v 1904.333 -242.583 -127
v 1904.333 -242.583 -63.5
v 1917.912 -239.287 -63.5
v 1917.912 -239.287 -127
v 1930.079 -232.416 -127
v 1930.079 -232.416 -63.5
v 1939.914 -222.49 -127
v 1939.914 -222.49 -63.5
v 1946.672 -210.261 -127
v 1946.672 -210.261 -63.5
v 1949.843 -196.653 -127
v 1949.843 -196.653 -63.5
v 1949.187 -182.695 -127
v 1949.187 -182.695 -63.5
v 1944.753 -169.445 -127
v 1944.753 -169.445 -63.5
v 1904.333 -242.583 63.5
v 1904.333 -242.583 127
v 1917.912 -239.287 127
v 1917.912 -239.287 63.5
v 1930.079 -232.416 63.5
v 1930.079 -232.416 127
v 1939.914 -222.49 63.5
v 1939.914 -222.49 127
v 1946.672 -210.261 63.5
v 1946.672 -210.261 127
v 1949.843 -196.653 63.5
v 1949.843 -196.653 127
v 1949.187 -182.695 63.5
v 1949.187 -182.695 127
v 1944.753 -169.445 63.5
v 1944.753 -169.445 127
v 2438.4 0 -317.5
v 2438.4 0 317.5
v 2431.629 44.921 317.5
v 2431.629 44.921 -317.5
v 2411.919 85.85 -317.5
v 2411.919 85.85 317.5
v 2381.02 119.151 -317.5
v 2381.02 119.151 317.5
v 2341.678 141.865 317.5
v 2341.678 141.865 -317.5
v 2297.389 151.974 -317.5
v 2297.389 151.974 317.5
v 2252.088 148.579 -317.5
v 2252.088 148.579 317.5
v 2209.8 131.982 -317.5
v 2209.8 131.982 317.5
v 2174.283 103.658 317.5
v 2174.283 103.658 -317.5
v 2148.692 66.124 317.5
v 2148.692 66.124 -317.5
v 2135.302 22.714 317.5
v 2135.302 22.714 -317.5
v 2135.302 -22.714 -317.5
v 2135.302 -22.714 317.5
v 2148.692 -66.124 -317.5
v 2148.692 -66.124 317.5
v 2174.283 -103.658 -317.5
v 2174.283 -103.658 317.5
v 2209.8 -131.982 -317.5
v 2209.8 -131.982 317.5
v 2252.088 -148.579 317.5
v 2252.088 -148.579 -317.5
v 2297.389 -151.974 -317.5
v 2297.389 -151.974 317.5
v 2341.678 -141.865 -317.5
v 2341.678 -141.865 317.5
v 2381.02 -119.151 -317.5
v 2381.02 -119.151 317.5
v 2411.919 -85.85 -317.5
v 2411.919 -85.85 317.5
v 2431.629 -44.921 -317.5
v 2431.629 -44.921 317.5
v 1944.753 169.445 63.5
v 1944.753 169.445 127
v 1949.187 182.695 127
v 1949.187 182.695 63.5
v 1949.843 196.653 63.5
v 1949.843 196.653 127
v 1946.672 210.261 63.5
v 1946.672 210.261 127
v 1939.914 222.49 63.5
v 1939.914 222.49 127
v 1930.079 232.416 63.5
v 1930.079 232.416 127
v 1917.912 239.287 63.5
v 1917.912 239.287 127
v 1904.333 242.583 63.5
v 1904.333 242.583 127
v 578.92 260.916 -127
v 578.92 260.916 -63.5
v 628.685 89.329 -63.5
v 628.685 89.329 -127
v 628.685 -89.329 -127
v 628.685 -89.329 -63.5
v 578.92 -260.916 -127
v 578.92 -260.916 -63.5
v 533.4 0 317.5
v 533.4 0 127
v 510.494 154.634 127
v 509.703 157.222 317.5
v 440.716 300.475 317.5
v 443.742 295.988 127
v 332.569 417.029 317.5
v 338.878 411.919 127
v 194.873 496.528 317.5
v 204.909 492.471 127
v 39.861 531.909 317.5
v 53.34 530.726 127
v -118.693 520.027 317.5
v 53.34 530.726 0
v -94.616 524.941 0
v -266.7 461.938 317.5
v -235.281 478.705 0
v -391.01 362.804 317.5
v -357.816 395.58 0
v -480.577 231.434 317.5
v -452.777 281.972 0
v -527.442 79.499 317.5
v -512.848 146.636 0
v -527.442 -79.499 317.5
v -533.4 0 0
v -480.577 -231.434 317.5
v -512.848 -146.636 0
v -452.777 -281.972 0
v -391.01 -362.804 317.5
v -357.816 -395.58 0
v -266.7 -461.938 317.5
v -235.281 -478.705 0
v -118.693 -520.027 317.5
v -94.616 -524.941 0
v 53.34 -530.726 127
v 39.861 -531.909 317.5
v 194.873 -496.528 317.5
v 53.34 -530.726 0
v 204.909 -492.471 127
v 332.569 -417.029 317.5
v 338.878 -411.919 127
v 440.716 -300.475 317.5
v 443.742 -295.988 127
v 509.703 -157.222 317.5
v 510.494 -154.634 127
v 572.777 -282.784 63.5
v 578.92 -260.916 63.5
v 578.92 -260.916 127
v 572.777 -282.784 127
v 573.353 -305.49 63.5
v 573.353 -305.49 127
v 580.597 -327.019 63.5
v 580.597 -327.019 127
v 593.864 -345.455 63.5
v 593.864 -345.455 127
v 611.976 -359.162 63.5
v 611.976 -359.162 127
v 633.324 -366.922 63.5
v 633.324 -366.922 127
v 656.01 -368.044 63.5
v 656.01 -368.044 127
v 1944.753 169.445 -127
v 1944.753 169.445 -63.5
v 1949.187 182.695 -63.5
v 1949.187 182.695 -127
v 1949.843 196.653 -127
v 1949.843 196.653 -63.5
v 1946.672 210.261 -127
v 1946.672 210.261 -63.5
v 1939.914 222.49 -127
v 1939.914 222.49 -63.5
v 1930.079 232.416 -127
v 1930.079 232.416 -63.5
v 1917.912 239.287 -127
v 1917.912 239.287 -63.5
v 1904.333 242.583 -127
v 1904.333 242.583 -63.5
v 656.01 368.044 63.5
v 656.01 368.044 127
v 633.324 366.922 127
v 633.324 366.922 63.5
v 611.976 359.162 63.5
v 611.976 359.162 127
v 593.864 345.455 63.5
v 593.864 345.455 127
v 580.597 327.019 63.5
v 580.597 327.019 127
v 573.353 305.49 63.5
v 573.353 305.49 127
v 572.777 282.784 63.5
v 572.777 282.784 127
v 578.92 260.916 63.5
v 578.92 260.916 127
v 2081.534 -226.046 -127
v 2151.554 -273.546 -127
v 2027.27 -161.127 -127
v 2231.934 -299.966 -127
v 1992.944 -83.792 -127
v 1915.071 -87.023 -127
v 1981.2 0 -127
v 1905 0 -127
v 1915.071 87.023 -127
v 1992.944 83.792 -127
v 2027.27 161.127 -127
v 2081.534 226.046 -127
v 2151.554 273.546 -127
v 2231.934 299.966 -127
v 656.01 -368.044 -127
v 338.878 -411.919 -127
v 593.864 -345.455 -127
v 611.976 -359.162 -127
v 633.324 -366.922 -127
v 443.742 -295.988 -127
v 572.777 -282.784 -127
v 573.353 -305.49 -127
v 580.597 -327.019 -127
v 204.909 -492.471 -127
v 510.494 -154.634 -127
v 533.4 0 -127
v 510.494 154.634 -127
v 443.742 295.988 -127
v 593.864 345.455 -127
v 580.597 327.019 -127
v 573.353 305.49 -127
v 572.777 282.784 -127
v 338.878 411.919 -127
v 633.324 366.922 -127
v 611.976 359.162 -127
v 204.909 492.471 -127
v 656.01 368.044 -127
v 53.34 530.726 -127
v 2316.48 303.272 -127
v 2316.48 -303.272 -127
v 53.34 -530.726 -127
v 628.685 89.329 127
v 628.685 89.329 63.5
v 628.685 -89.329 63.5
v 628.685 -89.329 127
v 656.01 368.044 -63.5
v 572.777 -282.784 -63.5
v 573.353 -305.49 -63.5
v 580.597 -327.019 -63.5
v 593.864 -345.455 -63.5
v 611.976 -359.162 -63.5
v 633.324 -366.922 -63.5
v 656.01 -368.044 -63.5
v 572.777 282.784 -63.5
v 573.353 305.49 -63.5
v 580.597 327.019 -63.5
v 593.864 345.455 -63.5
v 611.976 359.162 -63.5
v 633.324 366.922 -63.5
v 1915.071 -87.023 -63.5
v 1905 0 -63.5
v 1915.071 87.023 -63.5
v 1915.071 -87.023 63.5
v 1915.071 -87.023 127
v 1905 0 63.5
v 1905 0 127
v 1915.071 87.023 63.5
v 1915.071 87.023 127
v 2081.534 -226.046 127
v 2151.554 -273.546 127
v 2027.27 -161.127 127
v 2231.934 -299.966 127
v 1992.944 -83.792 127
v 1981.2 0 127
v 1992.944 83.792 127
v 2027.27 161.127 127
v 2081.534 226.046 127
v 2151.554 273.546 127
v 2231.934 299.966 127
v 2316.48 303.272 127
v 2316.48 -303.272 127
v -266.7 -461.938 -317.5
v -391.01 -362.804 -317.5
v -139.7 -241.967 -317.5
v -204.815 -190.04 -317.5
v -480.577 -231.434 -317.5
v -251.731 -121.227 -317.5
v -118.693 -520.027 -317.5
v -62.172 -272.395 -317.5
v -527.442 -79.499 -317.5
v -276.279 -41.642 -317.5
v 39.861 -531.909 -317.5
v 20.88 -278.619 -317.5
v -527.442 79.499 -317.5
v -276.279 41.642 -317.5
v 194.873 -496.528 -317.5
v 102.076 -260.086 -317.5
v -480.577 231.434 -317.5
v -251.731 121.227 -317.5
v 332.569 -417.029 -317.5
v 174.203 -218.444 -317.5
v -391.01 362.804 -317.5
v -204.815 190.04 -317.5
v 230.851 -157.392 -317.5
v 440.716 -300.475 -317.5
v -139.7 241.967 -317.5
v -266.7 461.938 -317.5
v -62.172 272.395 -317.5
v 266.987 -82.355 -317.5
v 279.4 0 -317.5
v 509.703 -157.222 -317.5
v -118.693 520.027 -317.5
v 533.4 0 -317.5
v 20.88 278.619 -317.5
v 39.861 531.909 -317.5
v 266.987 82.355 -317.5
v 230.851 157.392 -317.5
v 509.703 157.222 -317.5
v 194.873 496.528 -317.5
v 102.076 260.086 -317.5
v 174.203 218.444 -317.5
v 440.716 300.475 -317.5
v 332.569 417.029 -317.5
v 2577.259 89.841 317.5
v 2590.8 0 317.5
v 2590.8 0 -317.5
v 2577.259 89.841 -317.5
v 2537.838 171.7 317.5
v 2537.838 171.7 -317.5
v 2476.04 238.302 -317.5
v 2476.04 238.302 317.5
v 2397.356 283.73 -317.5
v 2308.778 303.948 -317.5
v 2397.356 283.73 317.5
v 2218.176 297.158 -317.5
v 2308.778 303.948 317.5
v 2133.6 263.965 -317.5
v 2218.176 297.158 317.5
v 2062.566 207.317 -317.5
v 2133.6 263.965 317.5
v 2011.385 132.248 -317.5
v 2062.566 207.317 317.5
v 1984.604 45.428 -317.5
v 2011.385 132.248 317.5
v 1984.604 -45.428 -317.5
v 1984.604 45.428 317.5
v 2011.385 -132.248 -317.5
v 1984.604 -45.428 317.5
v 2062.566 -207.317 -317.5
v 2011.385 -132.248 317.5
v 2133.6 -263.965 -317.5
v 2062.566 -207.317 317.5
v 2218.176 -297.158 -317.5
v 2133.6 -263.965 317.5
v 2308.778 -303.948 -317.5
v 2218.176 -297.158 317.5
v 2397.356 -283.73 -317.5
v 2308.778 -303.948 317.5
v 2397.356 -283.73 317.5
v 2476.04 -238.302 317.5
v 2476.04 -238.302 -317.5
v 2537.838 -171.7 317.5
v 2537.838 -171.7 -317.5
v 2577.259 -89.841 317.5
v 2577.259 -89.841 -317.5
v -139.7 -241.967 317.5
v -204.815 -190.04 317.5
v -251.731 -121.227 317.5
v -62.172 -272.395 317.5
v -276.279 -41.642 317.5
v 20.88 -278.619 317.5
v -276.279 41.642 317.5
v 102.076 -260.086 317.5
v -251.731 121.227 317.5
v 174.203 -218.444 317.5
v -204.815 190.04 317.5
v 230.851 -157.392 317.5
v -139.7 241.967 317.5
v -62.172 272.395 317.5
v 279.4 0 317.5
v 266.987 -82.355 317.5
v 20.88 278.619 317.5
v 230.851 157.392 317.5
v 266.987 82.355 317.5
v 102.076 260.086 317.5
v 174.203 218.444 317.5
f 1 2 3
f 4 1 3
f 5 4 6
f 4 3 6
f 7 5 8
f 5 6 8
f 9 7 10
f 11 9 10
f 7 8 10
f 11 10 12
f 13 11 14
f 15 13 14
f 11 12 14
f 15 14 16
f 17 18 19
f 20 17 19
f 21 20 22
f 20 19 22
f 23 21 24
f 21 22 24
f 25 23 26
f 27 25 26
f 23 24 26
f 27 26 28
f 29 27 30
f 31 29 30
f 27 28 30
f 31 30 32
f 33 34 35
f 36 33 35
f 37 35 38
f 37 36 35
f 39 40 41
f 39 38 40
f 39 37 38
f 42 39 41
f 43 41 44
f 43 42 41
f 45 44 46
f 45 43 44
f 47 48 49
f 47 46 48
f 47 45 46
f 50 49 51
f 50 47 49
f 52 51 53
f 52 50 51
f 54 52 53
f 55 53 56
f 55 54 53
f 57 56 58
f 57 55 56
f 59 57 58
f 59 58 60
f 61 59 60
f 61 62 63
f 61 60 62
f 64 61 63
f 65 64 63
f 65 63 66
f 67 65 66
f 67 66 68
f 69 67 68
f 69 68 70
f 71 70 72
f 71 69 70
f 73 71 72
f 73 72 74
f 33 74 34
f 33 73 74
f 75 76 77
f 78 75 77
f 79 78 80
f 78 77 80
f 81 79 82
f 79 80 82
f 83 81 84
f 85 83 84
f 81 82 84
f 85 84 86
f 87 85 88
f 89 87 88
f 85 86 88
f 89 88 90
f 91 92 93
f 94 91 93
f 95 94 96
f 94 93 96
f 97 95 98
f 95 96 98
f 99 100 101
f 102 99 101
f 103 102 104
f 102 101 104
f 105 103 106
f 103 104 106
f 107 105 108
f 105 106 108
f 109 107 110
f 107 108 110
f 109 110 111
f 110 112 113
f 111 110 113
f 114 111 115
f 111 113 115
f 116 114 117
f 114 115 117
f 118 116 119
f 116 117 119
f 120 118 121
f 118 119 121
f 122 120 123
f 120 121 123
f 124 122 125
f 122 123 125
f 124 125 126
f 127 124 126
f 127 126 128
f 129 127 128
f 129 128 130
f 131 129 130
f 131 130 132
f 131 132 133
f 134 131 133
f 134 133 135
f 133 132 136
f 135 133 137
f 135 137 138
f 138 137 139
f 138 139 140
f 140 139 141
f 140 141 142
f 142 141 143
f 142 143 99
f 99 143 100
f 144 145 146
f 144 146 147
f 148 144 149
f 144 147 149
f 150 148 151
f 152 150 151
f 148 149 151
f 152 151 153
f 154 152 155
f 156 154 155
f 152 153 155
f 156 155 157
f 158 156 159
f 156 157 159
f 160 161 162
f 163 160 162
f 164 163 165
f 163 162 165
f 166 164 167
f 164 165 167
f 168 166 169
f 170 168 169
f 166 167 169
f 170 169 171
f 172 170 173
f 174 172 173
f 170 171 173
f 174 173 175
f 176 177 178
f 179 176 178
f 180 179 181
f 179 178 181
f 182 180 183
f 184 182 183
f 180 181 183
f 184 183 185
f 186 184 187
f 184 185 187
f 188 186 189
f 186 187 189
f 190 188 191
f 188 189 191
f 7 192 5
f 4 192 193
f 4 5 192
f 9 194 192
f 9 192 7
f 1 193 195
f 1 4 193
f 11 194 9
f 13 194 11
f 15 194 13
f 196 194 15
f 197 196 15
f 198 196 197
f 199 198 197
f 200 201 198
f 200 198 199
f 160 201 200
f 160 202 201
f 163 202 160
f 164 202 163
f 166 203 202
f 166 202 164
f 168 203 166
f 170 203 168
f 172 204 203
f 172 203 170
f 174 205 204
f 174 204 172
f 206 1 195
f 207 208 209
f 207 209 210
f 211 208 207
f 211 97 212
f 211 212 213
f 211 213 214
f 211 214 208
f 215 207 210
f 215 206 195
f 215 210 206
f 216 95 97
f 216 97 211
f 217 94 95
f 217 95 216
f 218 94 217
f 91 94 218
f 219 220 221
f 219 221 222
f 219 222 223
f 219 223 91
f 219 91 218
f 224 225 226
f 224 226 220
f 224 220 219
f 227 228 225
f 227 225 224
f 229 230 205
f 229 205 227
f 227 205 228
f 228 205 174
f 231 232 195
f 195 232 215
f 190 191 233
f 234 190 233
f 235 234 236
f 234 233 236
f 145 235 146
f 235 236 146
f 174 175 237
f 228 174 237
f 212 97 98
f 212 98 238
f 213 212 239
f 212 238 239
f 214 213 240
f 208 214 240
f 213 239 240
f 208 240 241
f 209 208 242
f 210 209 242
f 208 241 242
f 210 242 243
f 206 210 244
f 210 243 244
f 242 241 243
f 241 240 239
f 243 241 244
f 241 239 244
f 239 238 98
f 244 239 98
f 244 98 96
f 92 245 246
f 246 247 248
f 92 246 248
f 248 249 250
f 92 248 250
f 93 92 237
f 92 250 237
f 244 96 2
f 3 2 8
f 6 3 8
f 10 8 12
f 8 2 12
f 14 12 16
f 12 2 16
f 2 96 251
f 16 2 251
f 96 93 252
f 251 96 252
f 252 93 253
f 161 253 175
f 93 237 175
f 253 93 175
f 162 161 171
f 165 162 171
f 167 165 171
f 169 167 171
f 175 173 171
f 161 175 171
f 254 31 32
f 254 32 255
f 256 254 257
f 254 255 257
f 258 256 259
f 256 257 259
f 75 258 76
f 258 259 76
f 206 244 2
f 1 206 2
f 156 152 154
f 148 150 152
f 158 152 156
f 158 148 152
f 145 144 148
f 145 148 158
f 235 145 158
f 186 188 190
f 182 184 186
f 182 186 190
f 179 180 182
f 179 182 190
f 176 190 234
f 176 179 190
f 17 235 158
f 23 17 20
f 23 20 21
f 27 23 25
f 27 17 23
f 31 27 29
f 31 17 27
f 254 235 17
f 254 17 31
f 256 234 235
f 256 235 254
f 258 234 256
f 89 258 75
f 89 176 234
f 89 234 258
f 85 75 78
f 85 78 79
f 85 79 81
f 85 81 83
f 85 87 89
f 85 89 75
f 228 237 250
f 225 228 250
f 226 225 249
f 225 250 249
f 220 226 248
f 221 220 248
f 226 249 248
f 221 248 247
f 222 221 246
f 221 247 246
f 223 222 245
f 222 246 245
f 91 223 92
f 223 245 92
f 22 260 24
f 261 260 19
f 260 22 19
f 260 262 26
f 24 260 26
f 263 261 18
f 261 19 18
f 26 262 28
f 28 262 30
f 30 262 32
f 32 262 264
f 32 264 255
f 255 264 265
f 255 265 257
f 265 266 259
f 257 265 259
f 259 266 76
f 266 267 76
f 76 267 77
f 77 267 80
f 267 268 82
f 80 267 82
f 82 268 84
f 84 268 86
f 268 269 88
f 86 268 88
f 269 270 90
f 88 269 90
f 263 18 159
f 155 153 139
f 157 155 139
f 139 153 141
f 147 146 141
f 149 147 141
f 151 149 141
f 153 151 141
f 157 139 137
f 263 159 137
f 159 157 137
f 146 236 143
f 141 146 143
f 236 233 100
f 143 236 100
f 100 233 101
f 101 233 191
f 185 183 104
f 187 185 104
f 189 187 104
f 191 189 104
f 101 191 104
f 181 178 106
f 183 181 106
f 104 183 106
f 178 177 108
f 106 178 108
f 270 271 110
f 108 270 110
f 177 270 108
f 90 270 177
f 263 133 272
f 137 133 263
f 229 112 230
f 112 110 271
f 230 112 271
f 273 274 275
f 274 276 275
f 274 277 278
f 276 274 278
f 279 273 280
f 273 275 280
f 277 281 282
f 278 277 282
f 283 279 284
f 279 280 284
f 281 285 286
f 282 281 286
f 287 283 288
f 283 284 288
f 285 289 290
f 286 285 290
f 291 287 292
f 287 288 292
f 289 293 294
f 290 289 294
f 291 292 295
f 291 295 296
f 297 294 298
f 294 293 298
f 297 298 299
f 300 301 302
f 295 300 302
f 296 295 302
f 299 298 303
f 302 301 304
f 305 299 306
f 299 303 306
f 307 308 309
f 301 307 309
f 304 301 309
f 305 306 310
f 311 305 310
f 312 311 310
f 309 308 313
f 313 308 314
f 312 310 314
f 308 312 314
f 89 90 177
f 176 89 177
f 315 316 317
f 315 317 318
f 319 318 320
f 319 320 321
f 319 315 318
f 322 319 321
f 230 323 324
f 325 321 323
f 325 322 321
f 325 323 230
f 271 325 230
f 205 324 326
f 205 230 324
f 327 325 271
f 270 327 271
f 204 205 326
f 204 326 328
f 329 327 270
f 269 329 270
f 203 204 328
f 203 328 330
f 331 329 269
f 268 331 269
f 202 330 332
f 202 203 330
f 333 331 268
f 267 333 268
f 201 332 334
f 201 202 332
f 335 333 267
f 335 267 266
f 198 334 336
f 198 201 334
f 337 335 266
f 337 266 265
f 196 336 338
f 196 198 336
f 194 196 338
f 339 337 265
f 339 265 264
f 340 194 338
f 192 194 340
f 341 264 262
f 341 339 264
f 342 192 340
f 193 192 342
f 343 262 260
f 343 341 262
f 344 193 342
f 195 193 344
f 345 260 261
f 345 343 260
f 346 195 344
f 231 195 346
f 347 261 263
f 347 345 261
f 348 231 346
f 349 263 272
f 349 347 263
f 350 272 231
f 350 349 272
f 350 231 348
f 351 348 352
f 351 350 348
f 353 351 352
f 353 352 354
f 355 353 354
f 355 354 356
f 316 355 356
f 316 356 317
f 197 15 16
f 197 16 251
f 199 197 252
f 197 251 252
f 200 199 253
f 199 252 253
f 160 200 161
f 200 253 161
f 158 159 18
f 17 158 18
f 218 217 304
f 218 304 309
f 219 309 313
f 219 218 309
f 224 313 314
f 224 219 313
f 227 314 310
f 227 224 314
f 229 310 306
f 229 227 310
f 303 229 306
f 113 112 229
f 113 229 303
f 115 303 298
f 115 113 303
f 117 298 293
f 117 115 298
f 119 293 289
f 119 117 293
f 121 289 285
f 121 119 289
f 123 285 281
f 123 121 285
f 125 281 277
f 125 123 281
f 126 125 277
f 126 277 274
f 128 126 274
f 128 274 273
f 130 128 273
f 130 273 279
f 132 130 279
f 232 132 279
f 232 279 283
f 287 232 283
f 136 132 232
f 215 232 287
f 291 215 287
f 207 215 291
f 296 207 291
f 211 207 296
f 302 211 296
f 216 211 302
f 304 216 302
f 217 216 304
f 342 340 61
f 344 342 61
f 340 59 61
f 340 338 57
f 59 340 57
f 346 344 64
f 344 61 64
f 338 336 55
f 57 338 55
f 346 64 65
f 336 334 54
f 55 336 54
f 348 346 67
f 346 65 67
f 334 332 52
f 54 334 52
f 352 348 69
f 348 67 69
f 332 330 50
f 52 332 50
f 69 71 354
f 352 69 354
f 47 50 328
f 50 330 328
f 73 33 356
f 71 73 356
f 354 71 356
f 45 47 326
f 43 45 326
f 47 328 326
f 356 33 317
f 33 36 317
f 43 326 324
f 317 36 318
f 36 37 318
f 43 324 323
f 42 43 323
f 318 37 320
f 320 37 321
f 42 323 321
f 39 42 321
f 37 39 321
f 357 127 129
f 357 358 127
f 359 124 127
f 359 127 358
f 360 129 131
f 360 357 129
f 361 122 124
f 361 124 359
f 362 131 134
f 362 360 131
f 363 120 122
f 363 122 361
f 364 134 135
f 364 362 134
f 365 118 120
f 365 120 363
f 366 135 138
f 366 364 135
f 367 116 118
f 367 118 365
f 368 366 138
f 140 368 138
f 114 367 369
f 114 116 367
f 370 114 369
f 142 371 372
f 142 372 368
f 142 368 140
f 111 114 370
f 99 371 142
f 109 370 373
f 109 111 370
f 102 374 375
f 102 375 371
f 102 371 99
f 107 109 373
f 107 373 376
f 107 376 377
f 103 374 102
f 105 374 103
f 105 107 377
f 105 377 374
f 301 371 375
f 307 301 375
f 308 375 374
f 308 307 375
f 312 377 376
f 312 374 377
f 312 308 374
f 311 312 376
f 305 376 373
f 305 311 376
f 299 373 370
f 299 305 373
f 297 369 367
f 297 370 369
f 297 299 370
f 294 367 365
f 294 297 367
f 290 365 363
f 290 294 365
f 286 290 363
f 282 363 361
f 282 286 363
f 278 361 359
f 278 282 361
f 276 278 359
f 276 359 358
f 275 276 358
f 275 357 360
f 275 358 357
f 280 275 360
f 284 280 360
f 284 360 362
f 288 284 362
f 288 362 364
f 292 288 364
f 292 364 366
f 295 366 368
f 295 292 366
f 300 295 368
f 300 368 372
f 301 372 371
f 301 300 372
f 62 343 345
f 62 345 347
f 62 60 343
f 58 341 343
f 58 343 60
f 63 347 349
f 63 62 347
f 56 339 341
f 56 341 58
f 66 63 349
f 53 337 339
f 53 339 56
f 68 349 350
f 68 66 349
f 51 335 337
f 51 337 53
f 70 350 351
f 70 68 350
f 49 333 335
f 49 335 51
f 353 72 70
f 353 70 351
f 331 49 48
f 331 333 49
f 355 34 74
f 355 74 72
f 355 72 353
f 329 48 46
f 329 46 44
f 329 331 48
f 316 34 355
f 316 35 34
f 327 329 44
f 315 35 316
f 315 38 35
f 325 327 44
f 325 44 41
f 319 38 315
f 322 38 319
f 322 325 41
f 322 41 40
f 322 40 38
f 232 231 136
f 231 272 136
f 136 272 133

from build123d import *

# Parameters (mm, degrees)
BOSS_EXTRUDE4_DEPTH     = 127
SKETCH12_R              = 533.4
SKETCH12_R_2            = 304.8
BOSS_EXTRUDE5_DEPTH     = 317.5
CUT_EXTRUDE3_DEPTH      = 2665.125832238
CUT_EXTRUDE3_DEPTH_BACK = 2665.125832238
SKETCH13_R              = 279.4
SKETCH13_R_2            = 152.4
CUT_EXTRUDE4_DEPTH      = 63.5
CUT_EXTRUDE5_START      = -63.5
CUT_EXTRUDE5_DEPTH      = 63.5


with BuildPart() as part:
    # Sketch6 → Boss-Extrude4 (new, symmetric)
    with BuildSketch(Plane.XY):
        with BuildLine():
            Line((53.34, 530.726298953), (2316.48, 303.27217083))
            ThreePointArc((2316.48, 303.27217083), (1981.2, 0), (2316.48, -303.27217083))
            Line((2316.48, -303.27217083), (53.34, -530.726298953))
            ThreePointArc((53.34, -530.726298953), (533.4, 0), (53.34, 530.726298953))
        make_face()
    extrude(amount=BOSS_EXTRUDE4_DEPTH, both=True)

    # Sketch12 → Boss-Extrude5 (add, symmetric)
    with BuildSketch(Plane.XY):
        Circle(SKETCH12_R)
        with Locations((2286, 0)):
            Circle(SKETCH12_R_2)
    extrude(amount=BOSS_EXTRUDE5_DEPTH, both=True)

    # Sketch13 → Cut-Extrude3 (cut, two sides: drawn at the far end of the back side and taken through both)
    with BuildSketch(Plane.XY.offset(-CUT_EXTRUDE3_DEPTH_BACK)):
        Circle(SKETCH13_R)
        with Locations((2286, 0)):
            Circle(SKETCH13_R_2)
    extrude(amount=CUT_EXTRUDE3_DEPTH + CUT_EXTRUDE3_DEPTH_BACK, mode=Mode.SUBTRACT)

    # Sketch14 → Cut-Extrude4 (cut)
    with BuildSketch(Plane.XY.offset(127)):
        with BuildLine():
            Line((1904.333401716, 242.58262047), (656.009943133, 368.043848625))
            ThreePointArc((656.009943133, 368.043848625), (586.539592083, 336.733940849), (578.919592083, 260.915898141))
            ThreePointArc((578.919592083, 260.915898141), (635, 0), (578.919592083, -260.915898141))
            ThreePointArc((578.919592083, -260.915898141), (586.539592083, -336.733940849), (656.009943133, -368.043848625))
            Line((656.009943133, -368.043848625), (1904.333401716, -242.58262047))
            ThreePointArc((1904.333401716, -242.58262047), (1943.715352031, -216.609091609), (1944.753001514, -169.444639999))
            ThreePointArc((1944.753001514, -169.444639999), (1905, 0), (1944.753001514, 169.444639999))
            ThreePointArc((1944.753001514, 169.444639999), (1943.715352031, 216.609091609), (1904.333401716, 242.58262047))
        make_face()
    extrude(amount=-CUT_EXTRUDE4_DEPTH, mode=Mode.SUBTRACT)

    # Sketch15 → Cut-Extrude5 (cut)
    with BuildSketch(Plane(origin=(0, 0, -127), x_dir=(-1, 0, 0), z_dir=(0, 0, -1)).offset(CUT_EXTRUDE5_START)):
        with BuildLine():
            Line((-1904.333401716, 242.58262047), (-656.009943133, 368.043848625))
            ThreePointArc((-656.009943133, 368.043848625), (-586.539592083, 336.733940849), (-578.919592083, 260.915898141))
            ThreePointArc((-578.919592083, 260.915898141), (-635, 0), (-578.919592083, -260.915898141))
            ThreePointArc((-578.919592083, -260.915898141), (-586.539592083, -336.733940849), (-656.009943133, -368.043848625))
            Line((-656.009943133, -368.043848625), (-1904.333401716, -242.58262047))
            ThreePointArc((-1904.333401716, -242.58262047), (-1943.715352031, -216.609091609), (-1944.753001514, -169.444639999))
            ThreePointArc((-1944.753001514, -169.444639999), (-1905, 0), (-1944.753001514, 169.444639999))
            ThreePointArc((-1944.753001514, 169.444639999), (-1943.715352031, 216.609091609), (-1904.333401716, 242.58262047))
        make_face()
    extrude(amount=CUT_EXTRUDE5_DEPTH, mode=Mode.SUBTRACT)


solid = part.part
